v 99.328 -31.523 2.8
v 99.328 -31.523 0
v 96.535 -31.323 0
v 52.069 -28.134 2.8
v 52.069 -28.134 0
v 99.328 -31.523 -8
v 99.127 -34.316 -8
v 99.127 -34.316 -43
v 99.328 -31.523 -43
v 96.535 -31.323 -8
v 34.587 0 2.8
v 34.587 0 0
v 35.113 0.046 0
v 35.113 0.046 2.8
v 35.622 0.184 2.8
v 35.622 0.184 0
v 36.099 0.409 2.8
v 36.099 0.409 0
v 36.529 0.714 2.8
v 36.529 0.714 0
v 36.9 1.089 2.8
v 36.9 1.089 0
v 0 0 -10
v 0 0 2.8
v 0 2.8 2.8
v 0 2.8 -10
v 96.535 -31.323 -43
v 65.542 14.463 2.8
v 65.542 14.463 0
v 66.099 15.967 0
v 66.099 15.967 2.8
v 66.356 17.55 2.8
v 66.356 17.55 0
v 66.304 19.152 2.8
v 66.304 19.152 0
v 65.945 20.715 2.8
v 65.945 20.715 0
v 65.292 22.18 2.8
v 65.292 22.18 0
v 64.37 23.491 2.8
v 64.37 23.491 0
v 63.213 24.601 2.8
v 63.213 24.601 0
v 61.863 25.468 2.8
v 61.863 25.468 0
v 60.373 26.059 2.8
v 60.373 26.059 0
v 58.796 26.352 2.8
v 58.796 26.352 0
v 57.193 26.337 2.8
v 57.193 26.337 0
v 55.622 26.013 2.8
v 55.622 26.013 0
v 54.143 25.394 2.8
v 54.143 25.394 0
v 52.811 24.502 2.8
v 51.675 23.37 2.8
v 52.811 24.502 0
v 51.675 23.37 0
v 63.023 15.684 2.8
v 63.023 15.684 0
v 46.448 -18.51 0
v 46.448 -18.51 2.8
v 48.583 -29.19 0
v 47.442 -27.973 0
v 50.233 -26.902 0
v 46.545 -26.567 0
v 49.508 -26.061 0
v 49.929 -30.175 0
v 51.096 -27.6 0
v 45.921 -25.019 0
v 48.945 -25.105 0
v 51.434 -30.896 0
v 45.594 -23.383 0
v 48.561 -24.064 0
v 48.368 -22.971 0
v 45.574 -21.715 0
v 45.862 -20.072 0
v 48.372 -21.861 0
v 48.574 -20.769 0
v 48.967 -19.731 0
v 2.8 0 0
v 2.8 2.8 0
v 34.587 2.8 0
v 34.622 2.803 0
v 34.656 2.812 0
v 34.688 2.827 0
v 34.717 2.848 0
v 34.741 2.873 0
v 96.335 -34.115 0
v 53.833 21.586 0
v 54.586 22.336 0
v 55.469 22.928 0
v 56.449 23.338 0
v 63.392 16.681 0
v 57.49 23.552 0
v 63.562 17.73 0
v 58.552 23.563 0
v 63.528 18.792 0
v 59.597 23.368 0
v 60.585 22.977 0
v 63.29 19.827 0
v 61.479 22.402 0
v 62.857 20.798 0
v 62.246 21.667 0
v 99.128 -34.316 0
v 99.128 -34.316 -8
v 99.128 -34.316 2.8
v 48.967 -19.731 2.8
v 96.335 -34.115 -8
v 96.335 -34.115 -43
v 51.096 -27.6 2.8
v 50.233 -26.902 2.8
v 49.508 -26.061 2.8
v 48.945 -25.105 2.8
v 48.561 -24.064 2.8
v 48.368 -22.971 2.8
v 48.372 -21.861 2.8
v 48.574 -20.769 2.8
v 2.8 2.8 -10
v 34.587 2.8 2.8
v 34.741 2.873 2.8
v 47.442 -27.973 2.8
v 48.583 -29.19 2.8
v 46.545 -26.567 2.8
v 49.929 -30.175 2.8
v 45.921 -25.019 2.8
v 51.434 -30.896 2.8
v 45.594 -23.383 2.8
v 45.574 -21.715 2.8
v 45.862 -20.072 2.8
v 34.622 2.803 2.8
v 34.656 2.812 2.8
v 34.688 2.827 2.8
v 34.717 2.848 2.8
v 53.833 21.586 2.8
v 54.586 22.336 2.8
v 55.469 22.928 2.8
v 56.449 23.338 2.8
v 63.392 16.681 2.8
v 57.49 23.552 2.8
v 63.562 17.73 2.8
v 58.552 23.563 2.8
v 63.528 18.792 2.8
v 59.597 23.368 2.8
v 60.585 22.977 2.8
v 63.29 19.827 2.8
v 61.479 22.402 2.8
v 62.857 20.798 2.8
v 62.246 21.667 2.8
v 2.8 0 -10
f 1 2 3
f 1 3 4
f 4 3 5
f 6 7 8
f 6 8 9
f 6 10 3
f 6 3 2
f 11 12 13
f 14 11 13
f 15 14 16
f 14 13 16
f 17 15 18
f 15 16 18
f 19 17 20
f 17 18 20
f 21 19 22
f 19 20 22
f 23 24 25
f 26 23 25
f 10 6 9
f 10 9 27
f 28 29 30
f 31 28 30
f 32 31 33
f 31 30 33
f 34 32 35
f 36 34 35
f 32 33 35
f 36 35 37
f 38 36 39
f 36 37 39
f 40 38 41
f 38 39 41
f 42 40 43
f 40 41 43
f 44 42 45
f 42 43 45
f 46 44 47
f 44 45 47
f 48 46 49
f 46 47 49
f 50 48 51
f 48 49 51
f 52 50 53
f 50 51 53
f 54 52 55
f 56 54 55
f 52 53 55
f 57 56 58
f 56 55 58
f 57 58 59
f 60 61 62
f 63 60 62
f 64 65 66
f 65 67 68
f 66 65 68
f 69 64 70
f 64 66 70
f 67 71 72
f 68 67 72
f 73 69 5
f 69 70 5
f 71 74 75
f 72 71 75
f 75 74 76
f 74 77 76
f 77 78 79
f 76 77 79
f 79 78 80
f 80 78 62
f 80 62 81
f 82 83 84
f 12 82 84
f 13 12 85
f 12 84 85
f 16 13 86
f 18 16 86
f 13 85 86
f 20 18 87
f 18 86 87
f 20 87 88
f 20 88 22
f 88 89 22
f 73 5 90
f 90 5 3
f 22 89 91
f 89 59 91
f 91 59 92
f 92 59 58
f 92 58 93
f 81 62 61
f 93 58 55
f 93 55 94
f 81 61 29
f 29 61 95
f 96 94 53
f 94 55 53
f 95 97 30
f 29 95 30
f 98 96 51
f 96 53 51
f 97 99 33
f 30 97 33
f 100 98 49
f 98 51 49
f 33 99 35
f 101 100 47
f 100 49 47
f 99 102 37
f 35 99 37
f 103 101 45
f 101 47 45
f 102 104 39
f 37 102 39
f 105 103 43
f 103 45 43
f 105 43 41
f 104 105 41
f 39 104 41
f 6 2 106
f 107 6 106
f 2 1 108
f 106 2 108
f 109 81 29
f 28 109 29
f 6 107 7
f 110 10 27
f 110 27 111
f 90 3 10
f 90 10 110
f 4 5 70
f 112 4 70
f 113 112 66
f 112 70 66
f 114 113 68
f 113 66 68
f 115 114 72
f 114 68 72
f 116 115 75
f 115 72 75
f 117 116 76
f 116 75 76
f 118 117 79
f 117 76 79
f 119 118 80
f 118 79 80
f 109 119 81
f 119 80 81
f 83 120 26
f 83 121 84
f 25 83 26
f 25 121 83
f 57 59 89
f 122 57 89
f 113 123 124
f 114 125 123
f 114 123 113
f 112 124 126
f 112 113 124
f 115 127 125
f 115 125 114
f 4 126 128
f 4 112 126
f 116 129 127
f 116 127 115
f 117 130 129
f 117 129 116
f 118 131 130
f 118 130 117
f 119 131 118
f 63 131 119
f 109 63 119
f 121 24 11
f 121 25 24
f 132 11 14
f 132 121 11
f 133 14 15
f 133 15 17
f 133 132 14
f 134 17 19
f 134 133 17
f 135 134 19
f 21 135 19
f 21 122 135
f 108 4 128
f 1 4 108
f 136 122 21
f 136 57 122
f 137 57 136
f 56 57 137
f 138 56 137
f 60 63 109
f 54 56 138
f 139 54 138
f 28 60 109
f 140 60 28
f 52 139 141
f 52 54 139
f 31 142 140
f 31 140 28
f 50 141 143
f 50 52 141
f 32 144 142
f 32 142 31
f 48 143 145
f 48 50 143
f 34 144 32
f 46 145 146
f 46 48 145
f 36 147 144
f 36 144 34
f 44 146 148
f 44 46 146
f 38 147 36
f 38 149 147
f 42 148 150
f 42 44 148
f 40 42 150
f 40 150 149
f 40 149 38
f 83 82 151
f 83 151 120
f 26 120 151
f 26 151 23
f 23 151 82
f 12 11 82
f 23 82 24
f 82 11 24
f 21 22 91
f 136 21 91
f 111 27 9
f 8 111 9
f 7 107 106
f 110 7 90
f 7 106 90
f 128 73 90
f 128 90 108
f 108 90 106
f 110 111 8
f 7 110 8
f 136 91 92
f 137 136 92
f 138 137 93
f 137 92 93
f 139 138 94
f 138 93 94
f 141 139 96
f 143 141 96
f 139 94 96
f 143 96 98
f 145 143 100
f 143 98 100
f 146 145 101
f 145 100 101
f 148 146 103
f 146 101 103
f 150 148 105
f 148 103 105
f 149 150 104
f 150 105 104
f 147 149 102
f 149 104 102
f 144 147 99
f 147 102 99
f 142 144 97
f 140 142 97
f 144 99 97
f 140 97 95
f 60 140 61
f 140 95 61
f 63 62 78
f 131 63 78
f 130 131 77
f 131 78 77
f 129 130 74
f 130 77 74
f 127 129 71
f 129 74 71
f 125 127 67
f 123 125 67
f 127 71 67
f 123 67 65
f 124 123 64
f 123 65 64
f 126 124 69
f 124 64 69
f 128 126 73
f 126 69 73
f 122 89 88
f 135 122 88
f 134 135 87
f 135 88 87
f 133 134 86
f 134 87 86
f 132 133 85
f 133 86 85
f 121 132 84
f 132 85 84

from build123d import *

# Parameters (mm, degrees)
Y_KSEKLIK_EKSTR_ZYON1_DEPTH = 2.8
IZIM2_W                     = 2.8
IZIM2_H                     = 2.8
Y_KSEKLIK_EKSTR_ZYON3_DEPTH = 45
Y_KSEKLIK_EKSTR_ZYON4_DEPTH = 8
IZIM4_W                     = 2.8
IZIM4_H                     = 2.803743846
KES_EKSTR_ZYON1_DEPTH       = 35
Y_KSEKLIK_EKSTR_ZYON5_DEPTH = 35


with BuildPart() as part:
    # Çizim1 → Yükseklik-Ekstrüzyon1 (new body)
    with BuildSketch(Plane.XY):
        with BuildLine():
            Line((0, 0), (34.587072671, 0))
            ThreePointArc((34.587072671, 0), (35.865324826, 0.285949258), (36.899900144, 1.089285714))
            Line((36.899900144, 1.089285714), (53.833333333, 21.586389745))
            ThreePointArc((53.833333333, 21.586389745), (61.045741484, 22.711143216), (63.022721024, 15.684376278))
            Line((63.022721024, 15.684376278), (46.447554388, -18.510124025))
            ThreePointArc((46.447554388, -18.510124025), (46.197115168, -25.807507473), (51.434005635, -30.895680351))
            Line((51.434005635, -30.895680351), (99.127590258, -34.315623722))
            Line((99.127590258, -34.315623722), (99.327854452, -31.522794645))
            Line((99.327854452, -31.522794645), (52.068910631, -28.134017876))
            ThreePointArc((52.068910631, -28.134017876), (48.729396862, -24.592999144), (48.967149147, -19.731452093))
            Line((48.967149147, -19.731452093), (65.542315784, 14.46304821))
            ThreePointArc((65.542315784, 14.46304821), (62.558873931, 25.067078316), (51.674694359, 23.369723078))
            Line((51.674694359, 23.369723078), (34.741261169, 2.872619048))
            ThreePointArc((34.741261169, 2.872619048), (34.672289482, 2.819063284), (34.587072671, 2.8))
            Line((34.587072671, 2.8), (0, 2.8))
            Line((0, 2.8), (0, 0))
        make_face()
    extrude(amount=Y_KSEKLIK_EKSTR_ZYON1_DEPTH)

    # Çizim2 → Yükseklik-Ekstrüzyon3 (add)
    with BuildSketch(Plane(origin=(0, 0, 0), x_dir=(-1, 0, 0), z_dir=(0, 0, -1))):
        with Locations((-1.4, 1.4)):
            Rectangle(IZIM2_W, IZIM2_H)
    extrude(amount=Y_KSEKLIK_EKSTR_ZYON3_DEPTH)

    # Çizim3 → Yükseklik-Ekstrüzyon4 (add)
    with BuildSketch(Plane(origin=(0, 0, 0), x_dir=(-1, 0, 0), z_dir=(0, 0, -1))):
        Polygon((-99.327854452, -31.522794645), (-99.127590258, -34.315623722), (-96.334761181, -34.115359528), (-96.535025375, -31.322530451), align=None)
    extrude(amount=Y_KSEKLIK_EKSTR_ZYON4_DEPTH)

    # Çizim4 → Kes-Ekstrüzyon1 (cut)
    with BuildSketch(Plane(origin=(0, 0, -45), x_dir=(-1, 0, 0), z_dir=(0, 0, -1))):
        with Locations((-1.4, 1.398128077)):
            Rectangle(IZIM4_W, IZIM4_H)
    extrude(amount=-KES_EKSTR_ZYON1_DEPTH, mode=Mode.SUBTRACT)

    # Çizim5 → Yükseklik-Ekstrüzyon5 (add)
    with BuildSketch(Plane(origin=(0, 0, -8), x_dir=(-1, 0, 0), z_dir=(0, 0, -1))):
        Polygon((-96.535025375, -31.322530451), (-96.334761181, -34.115359528), (-99.127284523, -34.315601799), (-99.327548717, -31.522772722), align=None)
    extrude(amount=Y_KSEKLIK_EKSTR_ZYON5_DEPTH)


solid = part.part
